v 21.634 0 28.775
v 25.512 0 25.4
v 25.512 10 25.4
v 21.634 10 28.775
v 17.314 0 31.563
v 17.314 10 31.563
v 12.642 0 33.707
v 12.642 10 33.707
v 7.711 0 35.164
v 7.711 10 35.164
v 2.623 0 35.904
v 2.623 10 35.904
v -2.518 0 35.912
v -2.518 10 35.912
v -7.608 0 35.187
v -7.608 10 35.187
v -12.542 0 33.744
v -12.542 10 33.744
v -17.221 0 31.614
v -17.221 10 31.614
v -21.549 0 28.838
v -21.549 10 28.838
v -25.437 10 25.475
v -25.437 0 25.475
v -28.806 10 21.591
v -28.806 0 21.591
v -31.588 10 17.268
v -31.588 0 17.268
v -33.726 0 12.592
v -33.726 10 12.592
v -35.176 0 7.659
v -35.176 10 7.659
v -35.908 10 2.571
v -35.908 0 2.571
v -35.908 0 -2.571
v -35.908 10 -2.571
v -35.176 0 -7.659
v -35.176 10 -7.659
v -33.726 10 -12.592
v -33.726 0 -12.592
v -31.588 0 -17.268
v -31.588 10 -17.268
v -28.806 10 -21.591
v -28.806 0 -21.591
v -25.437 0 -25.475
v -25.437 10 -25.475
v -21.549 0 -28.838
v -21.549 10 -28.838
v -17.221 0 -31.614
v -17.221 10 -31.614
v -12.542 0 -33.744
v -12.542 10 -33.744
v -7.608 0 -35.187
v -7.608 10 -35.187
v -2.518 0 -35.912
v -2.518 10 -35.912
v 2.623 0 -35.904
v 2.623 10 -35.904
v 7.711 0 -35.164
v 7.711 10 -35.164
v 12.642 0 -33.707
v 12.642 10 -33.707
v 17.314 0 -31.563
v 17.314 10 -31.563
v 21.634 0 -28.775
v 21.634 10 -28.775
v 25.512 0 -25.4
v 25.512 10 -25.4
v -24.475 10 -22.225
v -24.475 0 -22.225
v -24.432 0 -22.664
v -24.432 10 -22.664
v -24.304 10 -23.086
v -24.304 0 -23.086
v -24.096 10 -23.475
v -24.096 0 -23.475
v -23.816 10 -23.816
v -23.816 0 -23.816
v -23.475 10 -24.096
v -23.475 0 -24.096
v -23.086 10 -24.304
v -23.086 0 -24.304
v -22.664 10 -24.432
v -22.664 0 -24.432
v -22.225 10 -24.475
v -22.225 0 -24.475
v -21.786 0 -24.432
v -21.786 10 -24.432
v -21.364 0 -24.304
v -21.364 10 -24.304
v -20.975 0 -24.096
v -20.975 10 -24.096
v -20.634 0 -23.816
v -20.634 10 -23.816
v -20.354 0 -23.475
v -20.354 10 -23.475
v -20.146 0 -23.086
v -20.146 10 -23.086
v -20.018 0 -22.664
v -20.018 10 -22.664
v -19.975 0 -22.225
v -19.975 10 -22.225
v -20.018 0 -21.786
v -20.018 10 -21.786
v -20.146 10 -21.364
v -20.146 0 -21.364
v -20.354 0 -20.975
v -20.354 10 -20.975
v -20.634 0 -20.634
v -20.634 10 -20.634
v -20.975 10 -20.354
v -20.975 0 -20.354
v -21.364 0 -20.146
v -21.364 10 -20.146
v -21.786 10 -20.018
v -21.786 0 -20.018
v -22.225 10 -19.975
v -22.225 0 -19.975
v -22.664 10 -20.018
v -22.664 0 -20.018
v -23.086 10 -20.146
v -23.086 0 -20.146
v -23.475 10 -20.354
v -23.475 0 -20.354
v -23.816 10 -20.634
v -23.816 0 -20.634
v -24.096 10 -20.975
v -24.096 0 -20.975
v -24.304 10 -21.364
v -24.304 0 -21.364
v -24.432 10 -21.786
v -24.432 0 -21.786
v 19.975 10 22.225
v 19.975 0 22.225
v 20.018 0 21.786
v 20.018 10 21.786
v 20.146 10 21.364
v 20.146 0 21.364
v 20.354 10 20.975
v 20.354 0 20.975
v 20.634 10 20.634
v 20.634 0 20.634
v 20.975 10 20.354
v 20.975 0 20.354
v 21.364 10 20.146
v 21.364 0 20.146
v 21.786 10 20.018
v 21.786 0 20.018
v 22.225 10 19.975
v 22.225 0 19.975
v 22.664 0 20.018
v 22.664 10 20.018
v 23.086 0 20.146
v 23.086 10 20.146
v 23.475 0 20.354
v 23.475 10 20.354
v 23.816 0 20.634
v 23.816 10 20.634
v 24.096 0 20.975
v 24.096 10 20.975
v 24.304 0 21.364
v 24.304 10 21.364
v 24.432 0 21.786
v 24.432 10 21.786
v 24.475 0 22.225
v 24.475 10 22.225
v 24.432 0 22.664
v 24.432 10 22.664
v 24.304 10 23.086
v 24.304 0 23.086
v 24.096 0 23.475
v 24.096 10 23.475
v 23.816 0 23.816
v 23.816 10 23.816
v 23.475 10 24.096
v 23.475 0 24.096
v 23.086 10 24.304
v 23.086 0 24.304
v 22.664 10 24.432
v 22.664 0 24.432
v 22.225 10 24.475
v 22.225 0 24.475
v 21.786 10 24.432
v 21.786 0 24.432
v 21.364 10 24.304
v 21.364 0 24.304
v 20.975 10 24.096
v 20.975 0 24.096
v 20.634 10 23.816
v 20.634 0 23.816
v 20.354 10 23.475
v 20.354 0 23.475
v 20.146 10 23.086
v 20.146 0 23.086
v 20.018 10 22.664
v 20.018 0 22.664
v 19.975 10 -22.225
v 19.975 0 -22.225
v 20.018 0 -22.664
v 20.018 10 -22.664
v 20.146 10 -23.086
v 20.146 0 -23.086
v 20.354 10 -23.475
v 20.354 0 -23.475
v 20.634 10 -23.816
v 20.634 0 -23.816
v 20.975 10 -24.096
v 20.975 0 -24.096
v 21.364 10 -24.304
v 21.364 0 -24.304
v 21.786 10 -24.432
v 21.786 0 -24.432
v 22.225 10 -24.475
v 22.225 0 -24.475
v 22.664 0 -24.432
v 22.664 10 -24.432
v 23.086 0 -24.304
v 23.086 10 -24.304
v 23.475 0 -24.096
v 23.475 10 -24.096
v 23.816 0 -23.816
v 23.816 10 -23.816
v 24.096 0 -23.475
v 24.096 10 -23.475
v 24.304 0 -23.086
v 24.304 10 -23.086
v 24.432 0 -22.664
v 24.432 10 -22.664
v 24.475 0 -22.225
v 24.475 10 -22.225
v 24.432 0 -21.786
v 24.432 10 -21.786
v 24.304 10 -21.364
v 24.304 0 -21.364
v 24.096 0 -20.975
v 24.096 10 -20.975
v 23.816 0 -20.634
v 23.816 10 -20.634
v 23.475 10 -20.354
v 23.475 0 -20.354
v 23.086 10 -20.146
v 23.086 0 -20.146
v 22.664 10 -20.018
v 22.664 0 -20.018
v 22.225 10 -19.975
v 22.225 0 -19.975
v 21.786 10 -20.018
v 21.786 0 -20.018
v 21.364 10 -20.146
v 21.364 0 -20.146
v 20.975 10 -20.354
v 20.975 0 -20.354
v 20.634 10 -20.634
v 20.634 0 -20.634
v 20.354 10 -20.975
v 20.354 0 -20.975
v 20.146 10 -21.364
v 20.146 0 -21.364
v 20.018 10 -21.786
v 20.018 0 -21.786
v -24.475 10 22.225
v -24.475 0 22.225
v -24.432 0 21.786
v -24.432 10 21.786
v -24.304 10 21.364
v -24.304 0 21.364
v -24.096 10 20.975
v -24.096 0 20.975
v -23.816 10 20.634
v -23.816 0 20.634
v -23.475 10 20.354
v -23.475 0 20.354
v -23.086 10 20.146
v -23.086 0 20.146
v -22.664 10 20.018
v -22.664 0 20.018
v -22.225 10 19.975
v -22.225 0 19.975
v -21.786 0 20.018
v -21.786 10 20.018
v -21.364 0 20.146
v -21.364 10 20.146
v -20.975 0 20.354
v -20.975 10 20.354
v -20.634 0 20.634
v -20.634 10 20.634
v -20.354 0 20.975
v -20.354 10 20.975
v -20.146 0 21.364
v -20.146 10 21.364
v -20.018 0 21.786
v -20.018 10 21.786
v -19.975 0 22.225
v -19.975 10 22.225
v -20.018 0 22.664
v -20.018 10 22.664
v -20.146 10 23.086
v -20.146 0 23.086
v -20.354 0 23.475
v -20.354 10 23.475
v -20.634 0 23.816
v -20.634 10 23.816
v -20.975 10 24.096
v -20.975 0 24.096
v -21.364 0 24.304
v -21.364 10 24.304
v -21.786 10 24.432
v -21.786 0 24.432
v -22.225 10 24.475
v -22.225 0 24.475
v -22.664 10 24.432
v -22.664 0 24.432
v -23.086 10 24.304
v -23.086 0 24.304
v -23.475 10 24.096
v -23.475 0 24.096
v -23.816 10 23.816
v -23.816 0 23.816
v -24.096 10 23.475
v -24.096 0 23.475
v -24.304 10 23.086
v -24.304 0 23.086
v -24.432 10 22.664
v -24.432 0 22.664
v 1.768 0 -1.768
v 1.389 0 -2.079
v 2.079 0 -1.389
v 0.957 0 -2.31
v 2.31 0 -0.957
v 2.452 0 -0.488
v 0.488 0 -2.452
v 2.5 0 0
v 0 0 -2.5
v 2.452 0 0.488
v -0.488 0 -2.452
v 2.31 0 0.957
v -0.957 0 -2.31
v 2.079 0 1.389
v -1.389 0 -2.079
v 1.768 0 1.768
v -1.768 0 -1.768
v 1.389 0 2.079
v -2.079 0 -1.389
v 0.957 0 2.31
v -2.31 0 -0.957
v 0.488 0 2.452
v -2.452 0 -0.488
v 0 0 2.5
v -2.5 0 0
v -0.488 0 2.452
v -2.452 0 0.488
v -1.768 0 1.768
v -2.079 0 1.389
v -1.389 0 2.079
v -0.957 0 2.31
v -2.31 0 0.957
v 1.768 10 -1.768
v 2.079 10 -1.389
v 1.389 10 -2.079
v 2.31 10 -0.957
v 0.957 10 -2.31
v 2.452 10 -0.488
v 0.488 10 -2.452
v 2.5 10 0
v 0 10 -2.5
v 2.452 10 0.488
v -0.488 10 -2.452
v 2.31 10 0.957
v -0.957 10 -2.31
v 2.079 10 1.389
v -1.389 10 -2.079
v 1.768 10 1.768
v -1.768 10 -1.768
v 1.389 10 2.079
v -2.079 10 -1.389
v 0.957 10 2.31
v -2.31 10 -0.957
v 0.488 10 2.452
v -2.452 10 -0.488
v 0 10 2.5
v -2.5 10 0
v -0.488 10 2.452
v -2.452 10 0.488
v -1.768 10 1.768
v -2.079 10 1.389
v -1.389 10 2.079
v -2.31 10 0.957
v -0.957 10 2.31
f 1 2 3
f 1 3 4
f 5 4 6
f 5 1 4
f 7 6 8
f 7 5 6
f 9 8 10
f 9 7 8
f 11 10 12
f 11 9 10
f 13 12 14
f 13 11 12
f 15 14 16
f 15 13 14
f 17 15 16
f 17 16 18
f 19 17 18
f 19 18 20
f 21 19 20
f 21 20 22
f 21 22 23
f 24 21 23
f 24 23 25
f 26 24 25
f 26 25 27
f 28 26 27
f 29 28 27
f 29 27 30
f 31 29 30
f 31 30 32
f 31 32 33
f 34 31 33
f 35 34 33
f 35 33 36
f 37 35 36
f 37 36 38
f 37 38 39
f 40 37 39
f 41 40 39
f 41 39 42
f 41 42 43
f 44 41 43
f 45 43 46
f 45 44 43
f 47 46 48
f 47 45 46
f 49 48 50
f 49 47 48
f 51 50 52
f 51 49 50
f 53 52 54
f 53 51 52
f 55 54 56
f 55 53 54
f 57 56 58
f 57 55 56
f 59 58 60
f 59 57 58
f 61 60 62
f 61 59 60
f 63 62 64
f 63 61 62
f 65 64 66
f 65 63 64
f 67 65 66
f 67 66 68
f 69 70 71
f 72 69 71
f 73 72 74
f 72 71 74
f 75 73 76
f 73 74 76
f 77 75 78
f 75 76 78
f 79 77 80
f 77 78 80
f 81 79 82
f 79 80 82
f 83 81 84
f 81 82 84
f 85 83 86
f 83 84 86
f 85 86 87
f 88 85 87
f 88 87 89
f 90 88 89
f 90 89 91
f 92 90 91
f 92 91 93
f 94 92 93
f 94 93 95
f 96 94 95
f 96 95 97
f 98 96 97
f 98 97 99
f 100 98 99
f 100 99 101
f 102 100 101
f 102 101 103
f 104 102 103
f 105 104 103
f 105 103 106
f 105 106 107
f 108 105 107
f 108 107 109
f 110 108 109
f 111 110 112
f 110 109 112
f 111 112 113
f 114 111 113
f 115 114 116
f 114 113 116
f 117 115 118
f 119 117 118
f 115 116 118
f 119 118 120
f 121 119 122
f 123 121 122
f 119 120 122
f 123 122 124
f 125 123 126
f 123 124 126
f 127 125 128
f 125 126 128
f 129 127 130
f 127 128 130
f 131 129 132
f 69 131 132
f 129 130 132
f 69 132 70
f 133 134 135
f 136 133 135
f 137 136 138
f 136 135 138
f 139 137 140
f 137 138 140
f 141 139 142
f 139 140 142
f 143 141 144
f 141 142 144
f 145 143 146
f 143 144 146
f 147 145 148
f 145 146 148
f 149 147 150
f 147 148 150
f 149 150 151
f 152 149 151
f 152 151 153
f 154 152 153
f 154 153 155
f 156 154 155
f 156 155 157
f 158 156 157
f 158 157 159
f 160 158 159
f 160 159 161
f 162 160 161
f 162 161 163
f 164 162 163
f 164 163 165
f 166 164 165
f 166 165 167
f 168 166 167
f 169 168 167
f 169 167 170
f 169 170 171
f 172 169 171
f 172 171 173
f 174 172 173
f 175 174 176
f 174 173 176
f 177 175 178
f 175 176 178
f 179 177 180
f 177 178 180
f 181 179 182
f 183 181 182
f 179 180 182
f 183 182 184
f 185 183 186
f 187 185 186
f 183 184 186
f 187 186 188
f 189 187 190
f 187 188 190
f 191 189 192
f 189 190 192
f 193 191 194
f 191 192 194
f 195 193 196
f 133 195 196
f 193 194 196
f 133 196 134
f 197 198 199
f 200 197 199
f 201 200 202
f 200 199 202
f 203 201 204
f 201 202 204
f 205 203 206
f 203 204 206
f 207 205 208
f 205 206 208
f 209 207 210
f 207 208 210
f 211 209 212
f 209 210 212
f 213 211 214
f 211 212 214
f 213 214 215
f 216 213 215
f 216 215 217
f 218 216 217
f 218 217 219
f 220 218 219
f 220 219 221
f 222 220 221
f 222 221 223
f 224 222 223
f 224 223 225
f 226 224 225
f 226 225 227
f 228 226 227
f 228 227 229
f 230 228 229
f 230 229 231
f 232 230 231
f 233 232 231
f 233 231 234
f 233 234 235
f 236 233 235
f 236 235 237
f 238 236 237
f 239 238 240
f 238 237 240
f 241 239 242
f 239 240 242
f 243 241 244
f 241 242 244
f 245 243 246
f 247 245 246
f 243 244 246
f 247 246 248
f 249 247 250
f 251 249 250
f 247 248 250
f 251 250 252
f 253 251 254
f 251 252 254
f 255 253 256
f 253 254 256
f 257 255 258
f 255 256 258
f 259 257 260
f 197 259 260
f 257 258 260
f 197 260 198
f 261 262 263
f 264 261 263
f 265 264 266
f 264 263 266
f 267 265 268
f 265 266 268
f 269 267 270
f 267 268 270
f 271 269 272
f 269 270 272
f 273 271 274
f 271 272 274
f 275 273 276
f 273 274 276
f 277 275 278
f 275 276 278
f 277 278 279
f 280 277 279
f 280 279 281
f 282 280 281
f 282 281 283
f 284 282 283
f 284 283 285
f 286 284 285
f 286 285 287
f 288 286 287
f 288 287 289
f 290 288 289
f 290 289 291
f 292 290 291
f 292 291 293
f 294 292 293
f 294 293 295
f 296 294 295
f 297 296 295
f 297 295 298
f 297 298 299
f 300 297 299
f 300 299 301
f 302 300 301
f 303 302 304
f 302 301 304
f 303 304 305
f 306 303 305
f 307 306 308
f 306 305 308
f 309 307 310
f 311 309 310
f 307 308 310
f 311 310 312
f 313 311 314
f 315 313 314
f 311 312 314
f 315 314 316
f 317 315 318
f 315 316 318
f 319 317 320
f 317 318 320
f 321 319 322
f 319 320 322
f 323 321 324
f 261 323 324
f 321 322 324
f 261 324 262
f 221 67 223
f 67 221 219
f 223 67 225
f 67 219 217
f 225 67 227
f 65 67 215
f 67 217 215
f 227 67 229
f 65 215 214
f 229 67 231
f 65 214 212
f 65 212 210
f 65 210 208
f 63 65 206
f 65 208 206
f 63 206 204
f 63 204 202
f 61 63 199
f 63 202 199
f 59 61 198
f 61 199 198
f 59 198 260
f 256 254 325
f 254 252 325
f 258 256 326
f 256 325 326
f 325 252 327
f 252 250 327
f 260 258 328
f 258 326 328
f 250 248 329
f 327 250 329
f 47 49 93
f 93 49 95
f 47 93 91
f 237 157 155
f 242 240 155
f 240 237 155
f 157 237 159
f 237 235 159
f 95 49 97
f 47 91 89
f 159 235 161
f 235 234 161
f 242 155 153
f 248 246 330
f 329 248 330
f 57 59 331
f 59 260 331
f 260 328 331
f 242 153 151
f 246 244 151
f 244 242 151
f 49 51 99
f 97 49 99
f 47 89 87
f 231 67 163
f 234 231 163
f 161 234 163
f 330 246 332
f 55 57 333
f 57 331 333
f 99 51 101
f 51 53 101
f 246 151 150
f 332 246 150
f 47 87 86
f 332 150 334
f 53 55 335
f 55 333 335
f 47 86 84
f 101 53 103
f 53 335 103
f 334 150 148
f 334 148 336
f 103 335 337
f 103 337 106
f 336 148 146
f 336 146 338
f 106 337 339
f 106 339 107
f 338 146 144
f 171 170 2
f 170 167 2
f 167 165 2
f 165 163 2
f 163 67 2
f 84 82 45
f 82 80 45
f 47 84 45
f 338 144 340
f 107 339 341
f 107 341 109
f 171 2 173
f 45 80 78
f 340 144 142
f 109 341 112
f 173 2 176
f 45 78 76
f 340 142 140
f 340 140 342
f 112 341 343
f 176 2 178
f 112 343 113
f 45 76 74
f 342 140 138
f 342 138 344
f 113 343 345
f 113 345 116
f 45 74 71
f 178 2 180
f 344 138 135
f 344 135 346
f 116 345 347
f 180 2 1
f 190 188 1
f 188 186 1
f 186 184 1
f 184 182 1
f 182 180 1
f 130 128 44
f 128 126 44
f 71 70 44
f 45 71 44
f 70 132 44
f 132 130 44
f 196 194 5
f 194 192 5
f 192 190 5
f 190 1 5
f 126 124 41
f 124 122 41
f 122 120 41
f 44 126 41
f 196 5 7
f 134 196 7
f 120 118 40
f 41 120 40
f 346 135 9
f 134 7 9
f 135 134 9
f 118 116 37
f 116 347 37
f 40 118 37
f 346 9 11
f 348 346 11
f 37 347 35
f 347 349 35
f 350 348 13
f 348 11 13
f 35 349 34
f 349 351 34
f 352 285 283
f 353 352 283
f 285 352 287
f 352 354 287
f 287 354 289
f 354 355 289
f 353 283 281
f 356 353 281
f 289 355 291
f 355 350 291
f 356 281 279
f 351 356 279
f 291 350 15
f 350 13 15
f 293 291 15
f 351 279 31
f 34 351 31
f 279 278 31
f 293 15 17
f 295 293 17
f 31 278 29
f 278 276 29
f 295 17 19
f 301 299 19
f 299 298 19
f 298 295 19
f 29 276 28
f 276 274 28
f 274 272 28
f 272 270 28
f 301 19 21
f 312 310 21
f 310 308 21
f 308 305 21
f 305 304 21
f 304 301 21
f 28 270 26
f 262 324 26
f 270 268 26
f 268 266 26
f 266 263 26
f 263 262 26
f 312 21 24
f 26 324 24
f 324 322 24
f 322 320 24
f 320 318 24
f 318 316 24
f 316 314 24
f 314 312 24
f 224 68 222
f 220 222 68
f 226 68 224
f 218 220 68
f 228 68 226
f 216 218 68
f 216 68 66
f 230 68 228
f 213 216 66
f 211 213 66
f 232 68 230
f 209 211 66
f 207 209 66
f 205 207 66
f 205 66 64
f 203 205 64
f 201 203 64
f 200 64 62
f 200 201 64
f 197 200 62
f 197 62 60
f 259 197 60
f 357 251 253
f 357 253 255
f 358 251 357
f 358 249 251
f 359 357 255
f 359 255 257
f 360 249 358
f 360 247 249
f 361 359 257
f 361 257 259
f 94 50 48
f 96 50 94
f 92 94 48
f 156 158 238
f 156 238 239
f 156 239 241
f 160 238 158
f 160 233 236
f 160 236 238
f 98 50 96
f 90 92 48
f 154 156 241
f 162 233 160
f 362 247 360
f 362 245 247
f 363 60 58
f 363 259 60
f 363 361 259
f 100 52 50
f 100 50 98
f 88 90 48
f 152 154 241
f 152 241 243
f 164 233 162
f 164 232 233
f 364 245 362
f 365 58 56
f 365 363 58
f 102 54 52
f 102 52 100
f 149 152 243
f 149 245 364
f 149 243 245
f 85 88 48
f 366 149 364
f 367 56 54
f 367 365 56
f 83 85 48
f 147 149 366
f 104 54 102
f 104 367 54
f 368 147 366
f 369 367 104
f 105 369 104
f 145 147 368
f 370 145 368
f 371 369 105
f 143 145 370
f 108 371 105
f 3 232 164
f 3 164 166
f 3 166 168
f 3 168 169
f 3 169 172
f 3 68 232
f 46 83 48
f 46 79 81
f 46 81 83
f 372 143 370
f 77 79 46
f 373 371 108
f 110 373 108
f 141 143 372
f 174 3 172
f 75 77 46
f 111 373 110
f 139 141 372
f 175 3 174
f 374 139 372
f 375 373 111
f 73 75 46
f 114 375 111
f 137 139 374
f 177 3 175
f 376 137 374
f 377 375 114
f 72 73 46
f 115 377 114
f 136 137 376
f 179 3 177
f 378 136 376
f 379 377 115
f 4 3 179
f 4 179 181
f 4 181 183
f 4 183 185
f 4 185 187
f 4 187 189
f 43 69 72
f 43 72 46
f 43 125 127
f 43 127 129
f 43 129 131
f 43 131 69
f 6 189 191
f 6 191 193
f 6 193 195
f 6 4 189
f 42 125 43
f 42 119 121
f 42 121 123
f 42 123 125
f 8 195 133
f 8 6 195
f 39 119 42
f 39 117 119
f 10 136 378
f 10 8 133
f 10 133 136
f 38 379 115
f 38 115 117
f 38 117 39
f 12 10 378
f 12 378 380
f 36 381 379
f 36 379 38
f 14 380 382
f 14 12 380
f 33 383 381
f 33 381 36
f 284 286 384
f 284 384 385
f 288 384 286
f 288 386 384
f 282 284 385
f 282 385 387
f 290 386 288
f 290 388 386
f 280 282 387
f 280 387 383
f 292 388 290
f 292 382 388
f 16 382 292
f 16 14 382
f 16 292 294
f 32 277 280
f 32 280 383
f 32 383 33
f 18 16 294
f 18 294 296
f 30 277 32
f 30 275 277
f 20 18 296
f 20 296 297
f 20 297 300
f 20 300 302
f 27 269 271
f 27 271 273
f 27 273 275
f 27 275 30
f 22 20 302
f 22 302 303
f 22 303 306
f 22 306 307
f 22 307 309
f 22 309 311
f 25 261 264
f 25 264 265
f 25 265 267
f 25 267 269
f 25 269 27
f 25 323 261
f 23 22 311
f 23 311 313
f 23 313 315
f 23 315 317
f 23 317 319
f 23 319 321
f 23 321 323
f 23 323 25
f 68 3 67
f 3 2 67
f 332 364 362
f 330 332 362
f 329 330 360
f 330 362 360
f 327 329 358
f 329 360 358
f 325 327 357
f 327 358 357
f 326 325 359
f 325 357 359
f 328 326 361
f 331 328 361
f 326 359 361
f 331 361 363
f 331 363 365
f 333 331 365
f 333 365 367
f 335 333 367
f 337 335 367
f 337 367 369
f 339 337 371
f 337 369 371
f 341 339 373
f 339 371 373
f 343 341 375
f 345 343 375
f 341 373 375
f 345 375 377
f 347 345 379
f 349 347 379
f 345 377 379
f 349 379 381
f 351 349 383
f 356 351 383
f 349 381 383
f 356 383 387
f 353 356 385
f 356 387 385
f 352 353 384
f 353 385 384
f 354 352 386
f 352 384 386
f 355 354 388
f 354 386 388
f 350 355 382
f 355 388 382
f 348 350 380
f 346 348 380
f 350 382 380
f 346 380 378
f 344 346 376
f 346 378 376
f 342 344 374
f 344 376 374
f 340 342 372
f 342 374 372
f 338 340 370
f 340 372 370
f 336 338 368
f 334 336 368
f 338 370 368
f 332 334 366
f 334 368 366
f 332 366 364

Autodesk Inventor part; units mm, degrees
ref_plane "YZ Plane" through (0, 0, 0) normal (1, 0, 0) x (0, 1, 0)
ref_plane "XZ Plane" through (0, 0, 0) normal (0, 1, 0) x (-1, 0, 0)
ref_plane "XY Plane" through (0, 0, 0) normal (0, 0, 1) x (1, 0, 0)
sketch "Sketch1" plane through (0, 0, 0) normal (0, 1, 0) x (-1, 0, 0)
  circle A0 centre (0, 0) radius 36
  line L0 (-22.225, 22.225) -> (22.225, 22.225)
  line L1 (22.225, 22.225) -> (22.225, -22.225)
  line L2 (22.225, -22.225) -> (-22.225, -22.225)
  line L3 (-22.225, -22.225) -> (-22.225, 22.225)
  line L4 (-22.225, 22.225) -> (22.225, -22.225) construction
  line L5 (22.225, 22.225) -> (-22.225, -22.225) construction
  circle A1 centre (0, 0) radius 32.5
  circle A2 centre (22.225, -22.225) radius 2.25
  circle A3 centre (22.225, 22.225) radius 2.25
  circle A4 centre (-22.225, 22.225) radius 2.25
  circle A5 centre (-22.225, -22.225) radius 2.25
  line L6 (-25.512, 25.3996) -> (-25.512, -25.3996)
  dimension "d0" = 72
  dimension "d1" = 44.45
  dimension "d2" = 44.45
  dimension "d3" = 65
  dimension "d4" = 4.5
  dimension "d5" = 4.5
  dimension "d6" = 4.5
  dimension "d7" = 4.5
  dimension "d9" = 25.512
  dimension "d10" = 3.287
extrude "Extrusion1" add sketch "Sketch1" along normal blind 10 contours A0 L6 A1 A5 A2 A3 A4 | A1 A4 L3 A5 L6 | A1 A3 L0 A4 | A4 L0 A3 L1 A2 L2 A5 L3 | A5 L2 A2 A1 | A1 A2 L1 A3
sketch "Sketch2" plane through (0, 10, 0) normal (0, 1, 0) x (1, 0, 0)
  circle A0 centre (0, 0) radius 2.5
  dimension "d13" = 5
extrude "Extrusion2" cut sketch "Sketch2" against normal blind 10
properties part number "Bottom Cap outlet"
